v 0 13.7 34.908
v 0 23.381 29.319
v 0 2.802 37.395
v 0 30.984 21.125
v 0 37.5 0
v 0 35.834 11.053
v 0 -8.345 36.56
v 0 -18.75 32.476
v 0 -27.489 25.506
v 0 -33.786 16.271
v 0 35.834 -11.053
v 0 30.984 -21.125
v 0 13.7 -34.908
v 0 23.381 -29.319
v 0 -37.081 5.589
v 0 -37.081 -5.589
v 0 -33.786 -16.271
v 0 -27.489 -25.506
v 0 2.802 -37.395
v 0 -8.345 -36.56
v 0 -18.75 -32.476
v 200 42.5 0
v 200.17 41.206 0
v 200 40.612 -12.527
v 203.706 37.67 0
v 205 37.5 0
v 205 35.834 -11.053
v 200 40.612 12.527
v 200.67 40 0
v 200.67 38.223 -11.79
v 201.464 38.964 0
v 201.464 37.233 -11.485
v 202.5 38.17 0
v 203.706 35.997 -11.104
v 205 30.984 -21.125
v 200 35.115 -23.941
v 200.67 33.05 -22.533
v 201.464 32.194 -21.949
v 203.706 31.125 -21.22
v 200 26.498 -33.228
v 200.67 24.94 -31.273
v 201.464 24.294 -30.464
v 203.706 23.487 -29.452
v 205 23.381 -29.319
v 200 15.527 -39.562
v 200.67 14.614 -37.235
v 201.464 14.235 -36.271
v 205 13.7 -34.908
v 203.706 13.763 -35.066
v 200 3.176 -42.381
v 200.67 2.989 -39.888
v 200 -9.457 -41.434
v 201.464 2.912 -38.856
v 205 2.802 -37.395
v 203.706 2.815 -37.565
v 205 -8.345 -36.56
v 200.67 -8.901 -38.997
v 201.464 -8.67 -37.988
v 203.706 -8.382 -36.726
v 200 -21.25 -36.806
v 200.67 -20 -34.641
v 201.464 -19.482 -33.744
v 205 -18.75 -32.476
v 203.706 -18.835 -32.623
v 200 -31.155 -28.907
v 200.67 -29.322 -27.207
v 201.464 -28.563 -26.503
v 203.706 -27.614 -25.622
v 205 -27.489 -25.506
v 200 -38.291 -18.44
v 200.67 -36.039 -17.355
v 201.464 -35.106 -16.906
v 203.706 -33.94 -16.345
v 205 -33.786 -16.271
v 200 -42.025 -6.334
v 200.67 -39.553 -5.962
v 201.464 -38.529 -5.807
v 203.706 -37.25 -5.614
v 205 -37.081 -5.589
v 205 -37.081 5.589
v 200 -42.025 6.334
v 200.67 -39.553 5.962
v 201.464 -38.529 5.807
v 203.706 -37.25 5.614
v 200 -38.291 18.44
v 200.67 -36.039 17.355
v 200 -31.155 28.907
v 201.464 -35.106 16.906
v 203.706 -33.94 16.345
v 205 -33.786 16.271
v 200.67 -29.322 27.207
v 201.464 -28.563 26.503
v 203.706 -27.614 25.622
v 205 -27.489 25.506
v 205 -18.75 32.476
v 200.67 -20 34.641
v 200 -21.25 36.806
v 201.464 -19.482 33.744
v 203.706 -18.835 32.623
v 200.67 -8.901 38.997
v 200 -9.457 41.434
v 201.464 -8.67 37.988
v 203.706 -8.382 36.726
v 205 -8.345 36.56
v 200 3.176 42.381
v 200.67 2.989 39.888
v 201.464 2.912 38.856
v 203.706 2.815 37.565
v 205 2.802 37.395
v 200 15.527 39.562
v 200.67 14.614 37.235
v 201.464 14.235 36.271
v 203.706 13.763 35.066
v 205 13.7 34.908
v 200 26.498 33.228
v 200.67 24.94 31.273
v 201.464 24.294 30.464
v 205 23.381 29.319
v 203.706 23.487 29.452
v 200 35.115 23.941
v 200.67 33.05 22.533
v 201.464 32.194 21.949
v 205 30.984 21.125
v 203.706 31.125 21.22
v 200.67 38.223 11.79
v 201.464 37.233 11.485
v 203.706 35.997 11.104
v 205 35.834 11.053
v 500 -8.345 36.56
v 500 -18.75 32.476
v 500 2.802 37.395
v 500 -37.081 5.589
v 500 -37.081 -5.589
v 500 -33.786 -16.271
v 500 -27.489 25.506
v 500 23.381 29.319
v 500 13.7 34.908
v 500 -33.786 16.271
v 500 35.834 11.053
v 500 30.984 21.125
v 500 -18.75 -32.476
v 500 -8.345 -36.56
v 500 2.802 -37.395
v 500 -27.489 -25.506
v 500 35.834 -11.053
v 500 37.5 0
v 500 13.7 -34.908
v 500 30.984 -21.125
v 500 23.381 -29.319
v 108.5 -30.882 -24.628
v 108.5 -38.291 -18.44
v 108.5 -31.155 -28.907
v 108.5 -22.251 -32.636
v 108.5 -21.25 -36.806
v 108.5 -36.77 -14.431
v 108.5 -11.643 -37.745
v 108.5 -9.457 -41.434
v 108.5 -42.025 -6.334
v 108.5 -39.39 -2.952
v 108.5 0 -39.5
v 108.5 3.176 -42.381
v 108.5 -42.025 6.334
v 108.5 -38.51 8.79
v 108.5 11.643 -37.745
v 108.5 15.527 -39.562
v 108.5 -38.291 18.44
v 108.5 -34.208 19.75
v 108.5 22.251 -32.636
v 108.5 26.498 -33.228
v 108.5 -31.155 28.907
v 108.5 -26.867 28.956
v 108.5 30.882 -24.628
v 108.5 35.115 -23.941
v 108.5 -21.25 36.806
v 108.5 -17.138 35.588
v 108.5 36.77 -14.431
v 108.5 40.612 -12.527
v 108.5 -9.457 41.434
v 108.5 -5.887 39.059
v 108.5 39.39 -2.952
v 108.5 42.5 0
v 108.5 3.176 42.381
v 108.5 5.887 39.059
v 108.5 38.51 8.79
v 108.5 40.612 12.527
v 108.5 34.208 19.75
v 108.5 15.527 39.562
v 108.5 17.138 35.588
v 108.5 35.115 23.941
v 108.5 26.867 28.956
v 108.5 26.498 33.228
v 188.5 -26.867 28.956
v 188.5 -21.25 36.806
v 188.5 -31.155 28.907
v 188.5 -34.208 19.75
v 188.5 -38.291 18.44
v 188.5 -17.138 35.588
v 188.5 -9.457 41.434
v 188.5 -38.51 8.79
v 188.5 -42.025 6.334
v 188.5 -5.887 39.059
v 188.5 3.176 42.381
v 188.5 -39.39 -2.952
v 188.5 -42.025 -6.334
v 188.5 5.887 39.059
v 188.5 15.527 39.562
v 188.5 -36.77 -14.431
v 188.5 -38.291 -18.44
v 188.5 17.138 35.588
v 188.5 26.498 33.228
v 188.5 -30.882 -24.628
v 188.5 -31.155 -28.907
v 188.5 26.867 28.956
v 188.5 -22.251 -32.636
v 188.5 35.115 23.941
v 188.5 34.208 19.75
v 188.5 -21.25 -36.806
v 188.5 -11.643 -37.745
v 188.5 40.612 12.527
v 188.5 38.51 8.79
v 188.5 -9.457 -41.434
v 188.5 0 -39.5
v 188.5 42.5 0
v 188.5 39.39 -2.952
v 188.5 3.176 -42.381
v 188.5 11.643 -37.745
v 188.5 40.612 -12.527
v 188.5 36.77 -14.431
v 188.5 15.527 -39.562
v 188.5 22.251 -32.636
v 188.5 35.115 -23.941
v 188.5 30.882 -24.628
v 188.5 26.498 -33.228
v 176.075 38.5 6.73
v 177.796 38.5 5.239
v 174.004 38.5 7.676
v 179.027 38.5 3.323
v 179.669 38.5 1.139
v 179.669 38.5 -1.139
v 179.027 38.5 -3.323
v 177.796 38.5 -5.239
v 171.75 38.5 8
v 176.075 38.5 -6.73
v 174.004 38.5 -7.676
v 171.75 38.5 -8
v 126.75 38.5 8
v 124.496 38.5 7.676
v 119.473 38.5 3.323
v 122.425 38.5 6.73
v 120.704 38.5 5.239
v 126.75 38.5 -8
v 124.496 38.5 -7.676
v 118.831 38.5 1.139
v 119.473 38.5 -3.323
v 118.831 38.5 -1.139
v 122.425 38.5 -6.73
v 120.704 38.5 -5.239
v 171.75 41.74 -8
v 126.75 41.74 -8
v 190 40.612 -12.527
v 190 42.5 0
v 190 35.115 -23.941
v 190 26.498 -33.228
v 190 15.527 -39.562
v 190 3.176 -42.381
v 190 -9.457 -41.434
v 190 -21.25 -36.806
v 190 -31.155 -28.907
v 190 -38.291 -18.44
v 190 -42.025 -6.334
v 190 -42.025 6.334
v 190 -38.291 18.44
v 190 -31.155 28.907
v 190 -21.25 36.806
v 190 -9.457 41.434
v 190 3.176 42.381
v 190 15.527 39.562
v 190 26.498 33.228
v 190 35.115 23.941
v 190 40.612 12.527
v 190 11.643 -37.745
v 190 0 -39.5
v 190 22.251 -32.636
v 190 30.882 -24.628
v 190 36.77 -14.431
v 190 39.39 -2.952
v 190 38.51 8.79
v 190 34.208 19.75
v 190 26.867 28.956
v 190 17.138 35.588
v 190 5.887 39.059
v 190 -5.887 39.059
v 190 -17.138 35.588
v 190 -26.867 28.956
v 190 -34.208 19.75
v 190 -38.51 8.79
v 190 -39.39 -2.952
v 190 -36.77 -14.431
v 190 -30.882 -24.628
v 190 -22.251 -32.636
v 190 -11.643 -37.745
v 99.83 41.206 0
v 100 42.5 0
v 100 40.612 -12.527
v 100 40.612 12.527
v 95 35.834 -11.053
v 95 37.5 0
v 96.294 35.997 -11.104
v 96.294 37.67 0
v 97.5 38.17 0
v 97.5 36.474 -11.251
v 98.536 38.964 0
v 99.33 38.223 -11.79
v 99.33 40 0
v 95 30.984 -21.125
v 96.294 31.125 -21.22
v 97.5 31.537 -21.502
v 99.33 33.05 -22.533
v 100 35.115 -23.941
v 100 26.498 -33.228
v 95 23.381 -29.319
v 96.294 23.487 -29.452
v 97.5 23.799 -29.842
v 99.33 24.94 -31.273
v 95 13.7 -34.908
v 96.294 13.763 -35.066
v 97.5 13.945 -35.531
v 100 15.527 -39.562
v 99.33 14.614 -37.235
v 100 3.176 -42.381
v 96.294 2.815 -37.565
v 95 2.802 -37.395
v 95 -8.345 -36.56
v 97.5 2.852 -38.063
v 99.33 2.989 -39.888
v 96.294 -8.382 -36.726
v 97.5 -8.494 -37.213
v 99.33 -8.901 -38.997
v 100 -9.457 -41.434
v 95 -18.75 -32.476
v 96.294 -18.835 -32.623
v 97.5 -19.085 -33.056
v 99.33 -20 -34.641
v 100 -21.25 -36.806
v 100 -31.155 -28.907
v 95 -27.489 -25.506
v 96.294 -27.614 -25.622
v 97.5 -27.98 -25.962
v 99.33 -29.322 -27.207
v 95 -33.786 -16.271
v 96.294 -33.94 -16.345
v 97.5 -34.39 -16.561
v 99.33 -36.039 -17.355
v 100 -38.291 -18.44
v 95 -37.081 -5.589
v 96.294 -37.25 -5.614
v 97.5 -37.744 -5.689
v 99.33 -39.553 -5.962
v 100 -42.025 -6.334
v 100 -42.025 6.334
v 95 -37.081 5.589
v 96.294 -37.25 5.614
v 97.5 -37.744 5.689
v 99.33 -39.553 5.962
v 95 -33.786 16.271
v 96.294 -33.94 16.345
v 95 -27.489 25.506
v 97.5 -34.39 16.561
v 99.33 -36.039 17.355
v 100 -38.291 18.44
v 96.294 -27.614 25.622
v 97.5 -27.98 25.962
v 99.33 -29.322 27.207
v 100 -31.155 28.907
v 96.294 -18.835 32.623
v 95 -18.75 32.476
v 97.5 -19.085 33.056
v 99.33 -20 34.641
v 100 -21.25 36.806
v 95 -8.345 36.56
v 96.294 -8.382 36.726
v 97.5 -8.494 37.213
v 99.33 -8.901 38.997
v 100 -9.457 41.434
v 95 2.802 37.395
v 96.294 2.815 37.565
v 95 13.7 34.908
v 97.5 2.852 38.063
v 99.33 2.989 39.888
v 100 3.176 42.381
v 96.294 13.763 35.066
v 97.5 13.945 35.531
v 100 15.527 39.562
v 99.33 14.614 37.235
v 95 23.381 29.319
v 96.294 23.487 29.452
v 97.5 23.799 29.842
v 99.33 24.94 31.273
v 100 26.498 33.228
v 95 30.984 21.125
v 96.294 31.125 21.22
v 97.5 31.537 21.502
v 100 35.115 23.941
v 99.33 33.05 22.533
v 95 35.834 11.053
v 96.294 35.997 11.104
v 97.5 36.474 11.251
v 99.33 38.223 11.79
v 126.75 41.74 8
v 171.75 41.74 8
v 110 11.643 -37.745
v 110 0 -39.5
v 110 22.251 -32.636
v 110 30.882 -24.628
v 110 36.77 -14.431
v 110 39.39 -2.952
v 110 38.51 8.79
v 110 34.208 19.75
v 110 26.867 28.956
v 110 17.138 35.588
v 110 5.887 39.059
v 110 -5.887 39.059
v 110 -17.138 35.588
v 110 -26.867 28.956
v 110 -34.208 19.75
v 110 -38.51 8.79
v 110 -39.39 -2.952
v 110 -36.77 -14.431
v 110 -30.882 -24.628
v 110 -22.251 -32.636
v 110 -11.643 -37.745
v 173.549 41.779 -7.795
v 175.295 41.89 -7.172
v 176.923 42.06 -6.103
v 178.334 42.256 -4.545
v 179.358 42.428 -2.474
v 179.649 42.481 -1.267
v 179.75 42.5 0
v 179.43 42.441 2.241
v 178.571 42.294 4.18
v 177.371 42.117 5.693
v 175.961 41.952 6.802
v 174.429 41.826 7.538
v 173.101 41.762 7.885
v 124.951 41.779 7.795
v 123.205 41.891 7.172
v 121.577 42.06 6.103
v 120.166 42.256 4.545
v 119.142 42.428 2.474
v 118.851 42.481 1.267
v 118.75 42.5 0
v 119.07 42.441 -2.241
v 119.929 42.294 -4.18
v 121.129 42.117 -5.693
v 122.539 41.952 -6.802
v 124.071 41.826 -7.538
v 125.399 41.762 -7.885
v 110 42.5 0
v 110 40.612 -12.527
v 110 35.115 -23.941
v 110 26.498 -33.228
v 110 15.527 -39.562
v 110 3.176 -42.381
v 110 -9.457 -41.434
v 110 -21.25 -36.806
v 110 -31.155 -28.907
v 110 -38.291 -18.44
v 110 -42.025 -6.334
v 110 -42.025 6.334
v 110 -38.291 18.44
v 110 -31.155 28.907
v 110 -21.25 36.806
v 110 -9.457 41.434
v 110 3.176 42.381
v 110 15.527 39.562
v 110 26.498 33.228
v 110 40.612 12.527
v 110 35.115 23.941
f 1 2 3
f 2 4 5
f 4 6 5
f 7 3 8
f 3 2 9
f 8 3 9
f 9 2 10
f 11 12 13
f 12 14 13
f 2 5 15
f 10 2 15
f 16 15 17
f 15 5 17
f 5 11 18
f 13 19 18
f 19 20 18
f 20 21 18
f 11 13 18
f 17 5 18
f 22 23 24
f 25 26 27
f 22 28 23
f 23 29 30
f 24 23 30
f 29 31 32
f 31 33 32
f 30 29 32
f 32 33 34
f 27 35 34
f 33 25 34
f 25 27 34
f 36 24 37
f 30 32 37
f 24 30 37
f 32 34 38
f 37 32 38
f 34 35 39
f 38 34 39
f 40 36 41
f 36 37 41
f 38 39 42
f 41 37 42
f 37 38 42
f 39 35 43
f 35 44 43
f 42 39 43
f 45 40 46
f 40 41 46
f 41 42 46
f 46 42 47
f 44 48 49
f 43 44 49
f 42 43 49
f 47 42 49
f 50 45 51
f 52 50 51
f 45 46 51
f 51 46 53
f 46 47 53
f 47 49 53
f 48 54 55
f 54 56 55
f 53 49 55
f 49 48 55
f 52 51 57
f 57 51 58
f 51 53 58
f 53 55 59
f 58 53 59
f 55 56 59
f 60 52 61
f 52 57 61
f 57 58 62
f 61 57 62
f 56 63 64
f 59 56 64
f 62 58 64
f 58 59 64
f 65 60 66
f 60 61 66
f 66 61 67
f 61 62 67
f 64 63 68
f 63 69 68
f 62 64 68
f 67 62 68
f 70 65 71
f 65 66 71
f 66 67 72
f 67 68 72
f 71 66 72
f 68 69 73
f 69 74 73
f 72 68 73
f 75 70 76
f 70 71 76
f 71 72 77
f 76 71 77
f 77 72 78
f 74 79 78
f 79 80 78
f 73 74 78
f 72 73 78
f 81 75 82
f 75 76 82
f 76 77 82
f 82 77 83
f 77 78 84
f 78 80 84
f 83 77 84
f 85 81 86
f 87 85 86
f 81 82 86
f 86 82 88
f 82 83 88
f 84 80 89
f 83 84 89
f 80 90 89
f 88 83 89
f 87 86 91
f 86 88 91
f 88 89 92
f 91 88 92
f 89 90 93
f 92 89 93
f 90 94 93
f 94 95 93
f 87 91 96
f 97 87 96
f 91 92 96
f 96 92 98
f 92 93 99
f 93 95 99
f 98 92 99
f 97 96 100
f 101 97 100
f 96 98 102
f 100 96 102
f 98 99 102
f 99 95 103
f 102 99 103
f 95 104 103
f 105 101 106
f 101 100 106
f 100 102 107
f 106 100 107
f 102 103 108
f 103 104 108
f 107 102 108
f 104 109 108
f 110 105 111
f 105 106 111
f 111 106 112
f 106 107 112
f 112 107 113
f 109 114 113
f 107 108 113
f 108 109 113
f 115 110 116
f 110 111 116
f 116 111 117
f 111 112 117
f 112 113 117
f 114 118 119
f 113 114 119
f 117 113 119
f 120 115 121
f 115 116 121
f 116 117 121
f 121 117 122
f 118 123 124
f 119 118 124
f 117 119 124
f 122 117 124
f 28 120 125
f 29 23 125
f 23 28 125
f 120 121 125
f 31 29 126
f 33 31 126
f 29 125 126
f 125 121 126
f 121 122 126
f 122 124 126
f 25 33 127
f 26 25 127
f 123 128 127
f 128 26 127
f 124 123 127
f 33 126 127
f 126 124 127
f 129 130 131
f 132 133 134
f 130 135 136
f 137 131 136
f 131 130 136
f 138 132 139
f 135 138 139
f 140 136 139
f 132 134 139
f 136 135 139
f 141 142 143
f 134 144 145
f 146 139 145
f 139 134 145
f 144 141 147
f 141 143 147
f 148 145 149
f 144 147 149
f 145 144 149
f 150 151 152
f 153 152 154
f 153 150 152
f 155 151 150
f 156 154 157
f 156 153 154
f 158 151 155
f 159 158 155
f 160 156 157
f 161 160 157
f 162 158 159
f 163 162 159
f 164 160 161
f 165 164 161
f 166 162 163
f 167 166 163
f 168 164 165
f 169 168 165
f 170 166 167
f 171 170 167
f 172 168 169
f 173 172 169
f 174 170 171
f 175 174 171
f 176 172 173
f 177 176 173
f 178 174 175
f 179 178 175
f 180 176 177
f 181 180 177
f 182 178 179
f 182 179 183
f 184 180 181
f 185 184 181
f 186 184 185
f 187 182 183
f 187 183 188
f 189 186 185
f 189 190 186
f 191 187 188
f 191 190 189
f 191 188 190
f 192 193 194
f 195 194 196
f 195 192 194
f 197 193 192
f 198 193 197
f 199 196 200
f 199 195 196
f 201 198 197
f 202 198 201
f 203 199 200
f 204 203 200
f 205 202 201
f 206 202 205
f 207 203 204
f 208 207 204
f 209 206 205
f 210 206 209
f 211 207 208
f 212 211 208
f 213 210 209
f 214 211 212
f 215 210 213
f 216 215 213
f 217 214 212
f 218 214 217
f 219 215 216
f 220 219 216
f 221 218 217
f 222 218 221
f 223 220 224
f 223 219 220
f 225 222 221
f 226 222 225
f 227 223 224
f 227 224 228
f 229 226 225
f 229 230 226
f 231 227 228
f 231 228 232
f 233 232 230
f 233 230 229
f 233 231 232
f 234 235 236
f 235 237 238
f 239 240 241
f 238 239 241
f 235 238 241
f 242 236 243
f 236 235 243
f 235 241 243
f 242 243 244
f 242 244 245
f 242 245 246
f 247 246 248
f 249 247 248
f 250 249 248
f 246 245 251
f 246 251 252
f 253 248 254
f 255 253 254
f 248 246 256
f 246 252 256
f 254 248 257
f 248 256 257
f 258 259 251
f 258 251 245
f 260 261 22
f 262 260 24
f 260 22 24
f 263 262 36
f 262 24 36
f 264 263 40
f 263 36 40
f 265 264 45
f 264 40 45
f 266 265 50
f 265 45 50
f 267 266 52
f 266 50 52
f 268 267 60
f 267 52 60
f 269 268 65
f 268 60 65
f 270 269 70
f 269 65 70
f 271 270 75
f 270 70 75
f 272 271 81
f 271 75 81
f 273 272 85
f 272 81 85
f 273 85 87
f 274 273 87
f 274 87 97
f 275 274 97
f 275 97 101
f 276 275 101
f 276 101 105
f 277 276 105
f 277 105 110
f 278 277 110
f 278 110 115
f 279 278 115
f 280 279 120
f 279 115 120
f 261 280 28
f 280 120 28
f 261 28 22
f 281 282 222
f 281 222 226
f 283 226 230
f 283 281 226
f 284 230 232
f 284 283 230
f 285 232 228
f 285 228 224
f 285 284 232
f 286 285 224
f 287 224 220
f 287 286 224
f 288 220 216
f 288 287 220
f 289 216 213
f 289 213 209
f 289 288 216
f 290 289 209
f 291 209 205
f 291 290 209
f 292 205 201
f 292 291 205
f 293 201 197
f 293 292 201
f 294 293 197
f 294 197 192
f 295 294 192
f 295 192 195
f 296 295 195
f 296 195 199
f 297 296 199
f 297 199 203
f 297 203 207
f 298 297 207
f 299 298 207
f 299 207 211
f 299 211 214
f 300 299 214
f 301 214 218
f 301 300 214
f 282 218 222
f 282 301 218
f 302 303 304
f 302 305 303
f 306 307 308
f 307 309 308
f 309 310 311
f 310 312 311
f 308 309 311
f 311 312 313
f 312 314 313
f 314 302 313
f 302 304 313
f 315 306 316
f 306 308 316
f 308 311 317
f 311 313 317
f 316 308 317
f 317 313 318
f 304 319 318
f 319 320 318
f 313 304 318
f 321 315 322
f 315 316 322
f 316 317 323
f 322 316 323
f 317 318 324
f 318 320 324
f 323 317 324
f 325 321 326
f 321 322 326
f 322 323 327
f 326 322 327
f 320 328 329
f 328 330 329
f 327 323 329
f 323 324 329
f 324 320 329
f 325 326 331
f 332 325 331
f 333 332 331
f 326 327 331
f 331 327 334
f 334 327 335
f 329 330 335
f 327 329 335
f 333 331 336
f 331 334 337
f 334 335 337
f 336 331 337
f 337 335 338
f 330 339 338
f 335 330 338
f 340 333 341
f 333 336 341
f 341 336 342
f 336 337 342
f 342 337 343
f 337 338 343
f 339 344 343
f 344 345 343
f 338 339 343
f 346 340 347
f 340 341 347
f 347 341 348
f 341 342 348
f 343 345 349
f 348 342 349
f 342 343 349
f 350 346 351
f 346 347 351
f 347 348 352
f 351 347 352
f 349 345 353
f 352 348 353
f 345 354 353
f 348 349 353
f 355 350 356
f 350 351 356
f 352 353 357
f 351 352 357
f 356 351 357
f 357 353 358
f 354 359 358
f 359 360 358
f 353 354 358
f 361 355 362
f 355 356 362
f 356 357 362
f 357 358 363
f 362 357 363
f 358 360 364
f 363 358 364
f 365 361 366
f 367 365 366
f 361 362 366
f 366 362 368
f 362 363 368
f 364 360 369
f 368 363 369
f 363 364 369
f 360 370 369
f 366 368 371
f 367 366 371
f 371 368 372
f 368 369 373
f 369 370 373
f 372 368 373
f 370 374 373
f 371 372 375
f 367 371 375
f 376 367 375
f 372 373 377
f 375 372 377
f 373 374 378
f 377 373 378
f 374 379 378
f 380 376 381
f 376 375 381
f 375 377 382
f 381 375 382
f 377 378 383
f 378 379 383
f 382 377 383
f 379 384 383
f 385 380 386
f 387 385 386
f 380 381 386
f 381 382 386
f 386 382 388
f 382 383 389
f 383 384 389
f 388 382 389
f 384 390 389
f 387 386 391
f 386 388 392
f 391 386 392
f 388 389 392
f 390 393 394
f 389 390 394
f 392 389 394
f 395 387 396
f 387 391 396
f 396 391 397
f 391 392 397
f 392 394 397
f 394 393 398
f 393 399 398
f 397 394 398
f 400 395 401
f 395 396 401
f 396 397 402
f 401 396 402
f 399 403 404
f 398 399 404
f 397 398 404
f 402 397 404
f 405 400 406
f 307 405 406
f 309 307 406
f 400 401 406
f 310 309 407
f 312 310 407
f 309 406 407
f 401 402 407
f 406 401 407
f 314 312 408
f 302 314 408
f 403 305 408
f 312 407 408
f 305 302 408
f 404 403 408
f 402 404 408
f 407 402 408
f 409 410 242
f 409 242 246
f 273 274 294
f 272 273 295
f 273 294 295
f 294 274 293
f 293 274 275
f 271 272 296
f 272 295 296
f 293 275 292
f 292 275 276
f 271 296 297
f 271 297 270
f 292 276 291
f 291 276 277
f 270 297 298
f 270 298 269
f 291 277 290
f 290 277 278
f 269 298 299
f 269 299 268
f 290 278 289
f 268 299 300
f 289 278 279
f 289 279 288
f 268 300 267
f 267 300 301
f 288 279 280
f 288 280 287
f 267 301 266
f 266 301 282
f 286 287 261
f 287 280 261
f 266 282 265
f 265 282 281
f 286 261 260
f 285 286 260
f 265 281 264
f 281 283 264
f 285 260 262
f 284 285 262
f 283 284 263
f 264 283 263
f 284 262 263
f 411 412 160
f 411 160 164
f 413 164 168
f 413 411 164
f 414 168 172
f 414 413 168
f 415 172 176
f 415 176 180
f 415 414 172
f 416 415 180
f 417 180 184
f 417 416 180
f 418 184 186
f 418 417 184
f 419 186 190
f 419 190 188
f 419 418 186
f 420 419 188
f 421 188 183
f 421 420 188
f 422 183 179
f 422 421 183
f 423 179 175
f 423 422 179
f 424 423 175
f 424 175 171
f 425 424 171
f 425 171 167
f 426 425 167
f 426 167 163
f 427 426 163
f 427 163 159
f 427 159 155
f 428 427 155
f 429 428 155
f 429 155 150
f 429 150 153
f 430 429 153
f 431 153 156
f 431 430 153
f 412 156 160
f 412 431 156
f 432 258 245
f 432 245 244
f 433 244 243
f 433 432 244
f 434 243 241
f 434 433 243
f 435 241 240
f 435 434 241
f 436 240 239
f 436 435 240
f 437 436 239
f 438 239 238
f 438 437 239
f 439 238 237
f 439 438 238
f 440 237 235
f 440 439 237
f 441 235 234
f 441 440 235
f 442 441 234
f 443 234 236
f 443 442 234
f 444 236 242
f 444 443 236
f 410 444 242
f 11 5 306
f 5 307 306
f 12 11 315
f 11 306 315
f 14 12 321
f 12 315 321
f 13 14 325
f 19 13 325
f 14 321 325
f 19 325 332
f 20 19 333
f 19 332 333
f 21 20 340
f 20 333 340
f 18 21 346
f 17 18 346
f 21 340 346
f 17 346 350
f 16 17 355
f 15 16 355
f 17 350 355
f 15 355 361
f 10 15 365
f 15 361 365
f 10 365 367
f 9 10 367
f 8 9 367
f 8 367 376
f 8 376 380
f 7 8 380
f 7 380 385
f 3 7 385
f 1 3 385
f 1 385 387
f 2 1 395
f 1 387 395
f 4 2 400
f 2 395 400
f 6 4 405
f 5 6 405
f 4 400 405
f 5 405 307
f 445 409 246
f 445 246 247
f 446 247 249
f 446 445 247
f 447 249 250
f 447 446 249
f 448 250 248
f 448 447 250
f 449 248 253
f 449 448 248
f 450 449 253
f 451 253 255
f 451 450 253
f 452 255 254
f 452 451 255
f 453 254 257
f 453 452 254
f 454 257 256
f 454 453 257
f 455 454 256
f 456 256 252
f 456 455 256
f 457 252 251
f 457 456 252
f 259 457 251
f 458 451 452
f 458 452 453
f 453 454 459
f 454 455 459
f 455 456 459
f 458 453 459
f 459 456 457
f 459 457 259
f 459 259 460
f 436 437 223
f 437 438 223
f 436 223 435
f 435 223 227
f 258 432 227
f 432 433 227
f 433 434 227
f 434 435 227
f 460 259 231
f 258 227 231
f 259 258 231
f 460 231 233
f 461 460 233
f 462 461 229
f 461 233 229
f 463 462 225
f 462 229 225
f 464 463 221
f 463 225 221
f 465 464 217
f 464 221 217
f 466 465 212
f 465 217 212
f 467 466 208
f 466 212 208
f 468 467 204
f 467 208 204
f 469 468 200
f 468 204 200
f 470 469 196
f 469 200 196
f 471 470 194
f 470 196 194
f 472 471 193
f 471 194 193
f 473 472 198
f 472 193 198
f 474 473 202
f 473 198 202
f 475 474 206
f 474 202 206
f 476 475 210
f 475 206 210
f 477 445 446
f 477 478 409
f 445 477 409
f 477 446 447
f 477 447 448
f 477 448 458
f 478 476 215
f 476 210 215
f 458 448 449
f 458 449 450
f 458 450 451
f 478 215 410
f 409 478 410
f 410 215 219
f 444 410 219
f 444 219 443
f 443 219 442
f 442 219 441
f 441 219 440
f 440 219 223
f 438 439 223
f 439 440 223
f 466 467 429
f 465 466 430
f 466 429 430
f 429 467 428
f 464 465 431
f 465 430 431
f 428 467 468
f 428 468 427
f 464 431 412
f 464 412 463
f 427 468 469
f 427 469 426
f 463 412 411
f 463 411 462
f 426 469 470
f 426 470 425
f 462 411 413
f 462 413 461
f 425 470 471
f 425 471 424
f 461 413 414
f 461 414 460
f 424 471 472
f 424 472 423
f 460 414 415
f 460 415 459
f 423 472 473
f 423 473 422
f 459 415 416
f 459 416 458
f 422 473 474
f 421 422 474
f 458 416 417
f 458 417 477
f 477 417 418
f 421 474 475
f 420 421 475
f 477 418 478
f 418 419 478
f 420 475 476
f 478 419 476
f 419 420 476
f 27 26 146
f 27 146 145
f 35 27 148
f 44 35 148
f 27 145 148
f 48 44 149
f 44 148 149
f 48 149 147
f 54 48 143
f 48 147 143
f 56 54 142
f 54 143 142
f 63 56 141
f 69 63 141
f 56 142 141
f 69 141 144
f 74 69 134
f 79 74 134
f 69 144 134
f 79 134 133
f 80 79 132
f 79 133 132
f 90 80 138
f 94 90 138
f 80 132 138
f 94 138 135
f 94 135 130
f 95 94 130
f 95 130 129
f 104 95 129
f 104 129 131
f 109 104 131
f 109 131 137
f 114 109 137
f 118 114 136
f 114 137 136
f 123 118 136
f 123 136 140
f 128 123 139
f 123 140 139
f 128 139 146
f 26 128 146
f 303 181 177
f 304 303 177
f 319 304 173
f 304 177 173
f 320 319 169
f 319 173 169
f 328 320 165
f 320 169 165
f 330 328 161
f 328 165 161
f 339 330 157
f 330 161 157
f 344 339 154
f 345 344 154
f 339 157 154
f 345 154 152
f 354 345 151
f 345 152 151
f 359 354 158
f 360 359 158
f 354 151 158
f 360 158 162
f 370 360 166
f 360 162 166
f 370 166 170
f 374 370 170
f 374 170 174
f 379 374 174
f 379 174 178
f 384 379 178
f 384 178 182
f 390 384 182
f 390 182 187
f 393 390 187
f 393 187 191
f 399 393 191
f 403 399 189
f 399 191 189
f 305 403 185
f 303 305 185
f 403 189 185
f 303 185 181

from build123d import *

# Parameters (mm, degrees)
ESQUISSE2_R             = 42.5
ESQUISSE2_R_2           = 39.5
ENL_V_MAT_EXTRU_1_DEPTH = 1.5
ESQUISSE3_R             = 42.5
ESQUISSE3_R_2           = 39.5
ENL_V_MAT_EXTRU_2_DEPTH = 1.5
ENL_V_MAT_EXTRU_3_DEPTH = 4


with BuildPart() as part:
    # Esquisse1 → Révolution1 (revolve)
    with BuildSketch(Plane.XY):
        with BuildLine():
            Line((0, 0), (0, 37.5))
            Line((0, 37.5), (95, 37.5))
            ThreePointArc((95, 37.5), (98.535533906, 38.964466094), (100, 42.5))
            Line((100, 42.5), (200, 42.5))
            ThreePointArc((200, 42.5), (201.464466094, 38.964466094), (205, 37.5))
            Line((205, 37.5), (500, 37.5))
            Line((500, 37.5), (500, 0))
            Line((500, 0), (0, 0))
        make_face()
    revolve(axis=Axis((500, 0, 0), (-1, 0, 0)))

    # Esquisse2 → Enlèv. mat.-Extru.1 (cut)
    with BuildSketch(Plane(origin=(110, 0, 0), x_dir=(0, 0, -1), z_dir=(1, 0, 0))):
        with Locations(Location((0, 0, 0), (0, 0, 90))):
            Circle(ESQUISSE2_R)
        Circle(ESQUISSE2_R_2, mode=Mode.SUBTRACT)
    extrude(amount=-ENL_V_MAT_EXTRU_1_DEPTH, mode=Mode.SUBTRACT)

    # Esquisse3 → Enlèv. mat.-Extru.2 (cut)
    with BuildSketch(Plane(origin=(190, 0, 0), x_dir=(0, 0, -1), z_dir=(1, 0, 0))):
        Circle(ESQUISSE3_R)
        Circle(ESQUISSE3_R_2, mode=Mode.SUBTRACT)
    extrude(amount=-ENL_V_MAT_EXTRU_2_DEPTH, mode=Mode.SUBTRACT)

    # Esquisse4 → Enlèv. mat.-Extru.3 (cut)
    with BuildSketch(Plane(origin=(0, 42.5, 0), x_dir=(1, 0, 0), z_dir=(0, 1, 0))):
        with BuildLine():
            Line((126.75, 8), (171.75, 8))
            ThreePointArc((171.75, 8), (179.75, 0), (171.75, -8))
            Line((171.75, -8), (126.75, -8))
            ThreePointArc((126.75, -8), (118.75, 0), (126.75, 8))
        make_face()
    extrude(amount=-ENL_V_MAT_EXTRU_3_DEPTH, mode=Mode.SUBTRACT)


solid = part.part
